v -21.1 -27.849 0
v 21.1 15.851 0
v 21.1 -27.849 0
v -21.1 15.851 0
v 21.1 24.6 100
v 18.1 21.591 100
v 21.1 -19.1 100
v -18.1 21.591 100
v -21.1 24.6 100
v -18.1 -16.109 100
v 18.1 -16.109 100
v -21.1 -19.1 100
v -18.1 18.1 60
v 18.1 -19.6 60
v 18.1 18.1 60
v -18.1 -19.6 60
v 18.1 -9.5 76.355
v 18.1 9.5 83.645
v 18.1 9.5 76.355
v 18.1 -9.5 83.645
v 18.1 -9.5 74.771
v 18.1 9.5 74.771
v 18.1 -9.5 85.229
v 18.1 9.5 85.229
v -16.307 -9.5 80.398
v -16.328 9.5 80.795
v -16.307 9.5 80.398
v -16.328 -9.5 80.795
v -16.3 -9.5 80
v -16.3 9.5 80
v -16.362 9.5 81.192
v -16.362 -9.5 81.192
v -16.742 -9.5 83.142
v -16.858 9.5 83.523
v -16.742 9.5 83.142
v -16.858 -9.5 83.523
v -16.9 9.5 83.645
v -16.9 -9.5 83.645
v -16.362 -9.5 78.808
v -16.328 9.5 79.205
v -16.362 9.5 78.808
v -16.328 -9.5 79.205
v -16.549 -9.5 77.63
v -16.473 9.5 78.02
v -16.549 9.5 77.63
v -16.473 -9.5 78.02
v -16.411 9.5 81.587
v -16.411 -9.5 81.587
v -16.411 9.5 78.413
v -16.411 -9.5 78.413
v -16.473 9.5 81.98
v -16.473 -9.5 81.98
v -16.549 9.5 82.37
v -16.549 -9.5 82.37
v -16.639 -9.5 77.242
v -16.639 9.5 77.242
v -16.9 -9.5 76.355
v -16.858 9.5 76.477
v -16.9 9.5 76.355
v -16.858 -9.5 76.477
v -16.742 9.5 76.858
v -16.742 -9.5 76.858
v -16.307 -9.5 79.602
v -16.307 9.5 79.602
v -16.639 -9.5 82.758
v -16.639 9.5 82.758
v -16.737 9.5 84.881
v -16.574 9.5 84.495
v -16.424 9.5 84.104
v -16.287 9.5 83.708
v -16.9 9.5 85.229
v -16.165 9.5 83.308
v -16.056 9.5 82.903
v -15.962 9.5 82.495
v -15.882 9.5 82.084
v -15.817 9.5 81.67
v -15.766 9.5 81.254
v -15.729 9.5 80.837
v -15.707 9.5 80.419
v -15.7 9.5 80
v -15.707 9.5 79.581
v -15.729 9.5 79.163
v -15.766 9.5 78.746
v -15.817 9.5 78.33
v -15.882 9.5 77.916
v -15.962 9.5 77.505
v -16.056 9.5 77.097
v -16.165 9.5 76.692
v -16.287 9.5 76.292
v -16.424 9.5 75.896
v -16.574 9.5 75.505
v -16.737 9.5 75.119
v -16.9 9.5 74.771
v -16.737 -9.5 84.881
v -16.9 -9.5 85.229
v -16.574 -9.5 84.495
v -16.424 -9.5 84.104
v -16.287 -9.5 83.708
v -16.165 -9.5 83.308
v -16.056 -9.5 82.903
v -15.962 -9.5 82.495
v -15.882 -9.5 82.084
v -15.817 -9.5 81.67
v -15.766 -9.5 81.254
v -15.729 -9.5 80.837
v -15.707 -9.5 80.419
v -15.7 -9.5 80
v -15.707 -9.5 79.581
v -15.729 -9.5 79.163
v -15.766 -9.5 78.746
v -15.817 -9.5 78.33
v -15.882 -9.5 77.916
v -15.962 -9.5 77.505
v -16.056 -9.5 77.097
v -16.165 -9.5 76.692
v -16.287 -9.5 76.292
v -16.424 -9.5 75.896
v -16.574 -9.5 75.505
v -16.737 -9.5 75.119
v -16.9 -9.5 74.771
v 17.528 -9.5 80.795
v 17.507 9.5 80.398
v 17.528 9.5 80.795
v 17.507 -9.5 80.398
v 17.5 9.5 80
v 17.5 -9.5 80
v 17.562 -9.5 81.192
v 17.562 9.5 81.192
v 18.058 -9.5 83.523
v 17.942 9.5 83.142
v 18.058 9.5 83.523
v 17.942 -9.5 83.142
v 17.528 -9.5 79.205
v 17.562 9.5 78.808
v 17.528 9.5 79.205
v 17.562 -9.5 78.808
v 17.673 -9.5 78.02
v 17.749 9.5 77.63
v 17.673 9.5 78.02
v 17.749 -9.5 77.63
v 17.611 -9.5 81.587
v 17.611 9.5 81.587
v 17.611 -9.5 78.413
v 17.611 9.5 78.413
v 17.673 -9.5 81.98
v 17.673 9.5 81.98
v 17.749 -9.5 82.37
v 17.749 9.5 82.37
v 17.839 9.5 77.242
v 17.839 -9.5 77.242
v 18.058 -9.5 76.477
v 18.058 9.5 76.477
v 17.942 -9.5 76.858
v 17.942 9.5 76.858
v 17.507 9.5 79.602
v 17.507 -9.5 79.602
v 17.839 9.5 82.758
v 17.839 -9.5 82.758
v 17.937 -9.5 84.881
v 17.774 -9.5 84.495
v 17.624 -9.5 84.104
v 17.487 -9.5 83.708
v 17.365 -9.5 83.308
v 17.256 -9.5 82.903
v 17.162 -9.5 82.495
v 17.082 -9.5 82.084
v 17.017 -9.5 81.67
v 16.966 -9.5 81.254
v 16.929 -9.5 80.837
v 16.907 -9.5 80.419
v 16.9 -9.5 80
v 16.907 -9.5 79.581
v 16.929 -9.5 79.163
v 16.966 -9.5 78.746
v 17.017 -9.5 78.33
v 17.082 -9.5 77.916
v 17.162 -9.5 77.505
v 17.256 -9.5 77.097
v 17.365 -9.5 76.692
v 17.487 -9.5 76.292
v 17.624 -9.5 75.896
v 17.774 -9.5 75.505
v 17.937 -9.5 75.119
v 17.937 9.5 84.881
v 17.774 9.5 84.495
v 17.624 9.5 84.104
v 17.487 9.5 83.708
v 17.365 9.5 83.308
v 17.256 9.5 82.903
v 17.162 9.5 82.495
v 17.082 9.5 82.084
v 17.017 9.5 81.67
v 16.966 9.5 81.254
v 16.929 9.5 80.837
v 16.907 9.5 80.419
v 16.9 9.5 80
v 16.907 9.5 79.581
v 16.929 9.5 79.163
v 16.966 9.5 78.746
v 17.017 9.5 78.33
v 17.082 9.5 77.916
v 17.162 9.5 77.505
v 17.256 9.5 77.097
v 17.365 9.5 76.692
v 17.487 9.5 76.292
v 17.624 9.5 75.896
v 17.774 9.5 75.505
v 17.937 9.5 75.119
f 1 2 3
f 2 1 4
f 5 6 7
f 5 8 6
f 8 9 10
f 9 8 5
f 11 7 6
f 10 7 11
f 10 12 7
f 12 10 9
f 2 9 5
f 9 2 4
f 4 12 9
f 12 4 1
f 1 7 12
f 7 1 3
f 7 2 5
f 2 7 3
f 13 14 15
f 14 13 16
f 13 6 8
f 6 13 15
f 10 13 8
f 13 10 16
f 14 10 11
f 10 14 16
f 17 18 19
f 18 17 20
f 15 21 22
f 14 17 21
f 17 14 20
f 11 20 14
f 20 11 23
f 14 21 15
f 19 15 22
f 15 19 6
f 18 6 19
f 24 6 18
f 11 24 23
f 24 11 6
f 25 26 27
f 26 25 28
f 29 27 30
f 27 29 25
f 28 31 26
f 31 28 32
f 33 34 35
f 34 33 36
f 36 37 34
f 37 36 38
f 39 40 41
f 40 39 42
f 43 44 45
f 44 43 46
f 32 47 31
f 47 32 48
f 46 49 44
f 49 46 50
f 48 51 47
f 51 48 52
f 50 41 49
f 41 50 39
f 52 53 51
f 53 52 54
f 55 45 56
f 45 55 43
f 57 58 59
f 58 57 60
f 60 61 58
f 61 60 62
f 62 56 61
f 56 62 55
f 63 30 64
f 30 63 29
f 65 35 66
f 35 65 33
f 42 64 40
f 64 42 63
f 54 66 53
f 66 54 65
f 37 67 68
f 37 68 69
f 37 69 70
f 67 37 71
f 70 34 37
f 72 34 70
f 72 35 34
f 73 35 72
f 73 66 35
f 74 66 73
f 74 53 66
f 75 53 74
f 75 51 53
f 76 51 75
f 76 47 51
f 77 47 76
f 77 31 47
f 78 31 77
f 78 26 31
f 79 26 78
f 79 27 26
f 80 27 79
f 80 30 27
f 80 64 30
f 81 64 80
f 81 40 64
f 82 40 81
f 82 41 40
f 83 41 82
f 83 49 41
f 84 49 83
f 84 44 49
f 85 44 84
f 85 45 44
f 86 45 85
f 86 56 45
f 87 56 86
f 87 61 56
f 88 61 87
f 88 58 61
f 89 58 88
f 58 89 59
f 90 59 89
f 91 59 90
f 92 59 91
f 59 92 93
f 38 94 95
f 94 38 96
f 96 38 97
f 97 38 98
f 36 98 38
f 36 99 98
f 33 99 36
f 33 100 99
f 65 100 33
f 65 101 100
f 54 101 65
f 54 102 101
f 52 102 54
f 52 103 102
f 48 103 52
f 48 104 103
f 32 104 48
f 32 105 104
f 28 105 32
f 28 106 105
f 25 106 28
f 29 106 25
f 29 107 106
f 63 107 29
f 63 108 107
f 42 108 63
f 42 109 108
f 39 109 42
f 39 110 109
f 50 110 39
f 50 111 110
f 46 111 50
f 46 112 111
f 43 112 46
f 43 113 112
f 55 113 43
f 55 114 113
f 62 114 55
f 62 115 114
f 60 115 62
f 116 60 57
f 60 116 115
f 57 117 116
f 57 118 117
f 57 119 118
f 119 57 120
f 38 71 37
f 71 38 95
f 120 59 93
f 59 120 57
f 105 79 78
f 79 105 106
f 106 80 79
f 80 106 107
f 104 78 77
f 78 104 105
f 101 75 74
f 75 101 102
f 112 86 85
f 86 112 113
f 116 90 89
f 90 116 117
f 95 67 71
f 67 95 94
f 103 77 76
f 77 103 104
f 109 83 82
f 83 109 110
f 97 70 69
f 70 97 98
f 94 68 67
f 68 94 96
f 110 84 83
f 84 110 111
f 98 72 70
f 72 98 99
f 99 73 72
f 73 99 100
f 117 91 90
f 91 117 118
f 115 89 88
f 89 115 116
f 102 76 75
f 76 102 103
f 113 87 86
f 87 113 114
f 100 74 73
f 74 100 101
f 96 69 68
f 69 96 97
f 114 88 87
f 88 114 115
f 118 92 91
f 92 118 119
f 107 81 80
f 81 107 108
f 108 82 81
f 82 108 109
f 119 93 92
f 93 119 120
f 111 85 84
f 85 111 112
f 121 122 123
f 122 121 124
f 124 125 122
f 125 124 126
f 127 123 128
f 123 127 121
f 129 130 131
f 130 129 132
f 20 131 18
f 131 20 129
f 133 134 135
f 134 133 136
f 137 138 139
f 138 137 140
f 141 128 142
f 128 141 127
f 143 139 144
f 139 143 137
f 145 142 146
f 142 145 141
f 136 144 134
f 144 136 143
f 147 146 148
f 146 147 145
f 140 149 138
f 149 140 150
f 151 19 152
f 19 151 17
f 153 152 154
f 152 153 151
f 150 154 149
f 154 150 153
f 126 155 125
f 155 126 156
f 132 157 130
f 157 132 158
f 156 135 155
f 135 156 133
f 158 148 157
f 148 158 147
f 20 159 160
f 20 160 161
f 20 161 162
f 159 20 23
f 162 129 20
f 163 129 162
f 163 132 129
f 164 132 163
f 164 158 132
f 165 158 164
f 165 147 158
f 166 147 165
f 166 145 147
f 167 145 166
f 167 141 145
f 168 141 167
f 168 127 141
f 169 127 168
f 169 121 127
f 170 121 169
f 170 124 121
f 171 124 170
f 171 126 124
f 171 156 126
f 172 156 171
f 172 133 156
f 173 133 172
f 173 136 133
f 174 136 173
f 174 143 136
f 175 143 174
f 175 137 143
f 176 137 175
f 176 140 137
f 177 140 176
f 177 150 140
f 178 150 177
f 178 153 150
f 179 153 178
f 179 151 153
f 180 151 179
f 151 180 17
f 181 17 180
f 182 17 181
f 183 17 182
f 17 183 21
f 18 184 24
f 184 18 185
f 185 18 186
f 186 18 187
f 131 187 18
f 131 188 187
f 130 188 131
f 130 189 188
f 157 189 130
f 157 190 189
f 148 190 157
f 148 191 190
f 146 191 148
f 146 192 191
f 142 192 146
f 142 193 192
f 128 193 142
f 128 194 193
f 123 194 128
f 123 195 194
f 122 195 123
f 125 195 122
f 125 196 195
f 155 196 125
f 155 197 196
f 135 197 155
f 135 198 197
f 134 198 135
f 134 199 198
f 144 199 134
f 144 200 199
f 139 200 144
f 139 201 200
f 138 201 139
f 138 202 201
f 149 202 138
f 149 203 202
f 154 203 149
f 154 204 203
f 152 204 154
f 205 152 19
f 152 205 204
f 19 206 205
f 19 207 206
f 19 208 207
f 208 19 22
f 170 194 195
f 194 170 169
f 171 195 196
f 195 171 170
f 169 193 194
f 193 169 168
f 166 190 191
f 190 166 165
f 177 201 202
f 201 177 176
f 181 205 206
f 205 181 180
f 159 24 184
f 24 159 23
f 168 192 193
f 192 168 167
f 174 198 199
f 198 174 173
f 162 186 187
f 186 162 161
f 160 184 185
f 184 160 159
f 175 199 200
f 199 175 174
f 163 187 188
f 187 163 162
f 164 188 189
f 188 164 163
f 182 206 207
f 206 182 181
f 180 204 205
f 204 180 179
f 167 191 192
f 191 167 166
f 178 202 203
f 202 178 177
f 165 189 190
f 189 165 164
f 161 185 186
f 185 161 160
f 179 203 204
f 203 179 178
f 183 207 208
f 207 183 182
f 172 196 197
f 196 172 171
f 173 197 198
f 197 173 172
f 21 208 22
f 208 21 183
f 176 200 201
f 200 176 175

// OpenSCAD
// Chair Stilts
// Paul Murrin - Feb 2013


// Raise required (mm)
raise = 60; // [0:200]

// Overall height - includes the part the leg inserts into (mm)
height = 100; // [0:200]

//  (mm)
wallThickness = 3; // [1:10]

//  - left to right (mm)
legWidth = 35;

//  - front to back (mm)
legDepth = 38;

// of leg (degrees from vertical)
angle = 5;

// Margin over the size of the leg specified
insetOversize = 0.6;

// Bulge to grip the leg - bulge width on each side (mm)
gripperBulge = 1.2;

// Bulge wall thickness;
gripperWall = 0.6;



module gripper(width, bulge)
{
	echo(width, bulge);
	radius = bulge*10;
	translate([-(radius-bulge),0,0]) rotate([90,0,0])
		difference() 	
		{
			cylinder(h=width, r=radius, center=true, $fn=180);
			union() {
				cylinder(h=width, r=radius-gripperWall, center=true, $fn=180);
				translate([-bulge, , 0]) cube([radius*2, radius*2, width], center=true); 
			}
		}
}


/* Generate coordinates of key points
 * x1,x2,y1,y2 = corners of bottom of cutout (where base of existing legs will go)
 * topOffset = offset at top of stilt in y axis due to angle of legs
 * baseOffset = offset at base of stilt in y axis due to angle of legs
 */
assign(		/* Points on base of cutout */
	x1= -(legWidth/2 + insetOversize),
	x2= +(legWidth/2 + insetOversize),
	y1= -(legDepth/2 + insetOversize),
	y2= +(legWidth/2 + insetOversize),
	topOffset = tan(angle)*(height-raise),
	baseOffset = -tan(angle)*raise
)
union()
{
	difference() 
	{
		/* Generate the outside shell */
		polyhedron(	
			points = [
				[x1-wallThickness,y1-wallThickness+baseOffset,0], 
				[x1-wallThickness,y2+wallThickness+baseOffset,0], 
				[x2+wallThickness,y2+wallThickness+baseOffset,0], 
				[x2+wallThickness,y1-wallThickness+baseOffset,0],
				[x1-wallThickness,y1-wallThickness+topOffset,height], 
				[x1-wallThickness,y2+wallThickness+topOffset,height], 
				[x2+wallThickness,y2+wallThickness+topOffset,height], 
				[x2+wallThickness,y1-wallThickness+topOffset,height]],
 			triangles = [
				[0,3,2],[0,2,1],	/* Base */
				[4,5,6],[4,6,7], /* Top */
				[0,1,4],[4,1,5],	
				[3,7,2],[2,7,6],
				[0,4,7],[7,3,0],
				[1,2,6],[1,6,5]],
			convexity = 2);


		/*Generate the cutout */
		polyhedron(	
			points = [
				[x1,y1,raise], [x1,y2,raise], 
				[x2,y2,raise], [x2,y1,raise],
				[x1,y1+topOffset,height+0.1], [x1,y2+topOffset,height+0.1], 
				[x2,y2+topOffset,height+0.1], [x2,y1+topOffset,height+0.1]],
 			triangles = [
				[0,3,2],[0,2,1],	/* Base */
				[4,5,6],[4,6,7], /* Top */
				[0,1,4],[4,1,5],	
				[3,7,2],[2,7,6],
				[0,4,7],[7,3,0],
				[1,2,6],[1,6,5]],
			convexity = 2);
	}

	/* Add bulges to grip the legs */
	translate([-legWidth/2 + insetOversize, 0, height - (height-raise)/2]) 
		gripper(legDepth/2, gripperBulge);
	translate([legWidth/2 + insetOversize, 0, height - (height-raise)/2]) 
		rotate([0,0,180]) 
			gripper(legDepth/2, gripperBulge);
}
